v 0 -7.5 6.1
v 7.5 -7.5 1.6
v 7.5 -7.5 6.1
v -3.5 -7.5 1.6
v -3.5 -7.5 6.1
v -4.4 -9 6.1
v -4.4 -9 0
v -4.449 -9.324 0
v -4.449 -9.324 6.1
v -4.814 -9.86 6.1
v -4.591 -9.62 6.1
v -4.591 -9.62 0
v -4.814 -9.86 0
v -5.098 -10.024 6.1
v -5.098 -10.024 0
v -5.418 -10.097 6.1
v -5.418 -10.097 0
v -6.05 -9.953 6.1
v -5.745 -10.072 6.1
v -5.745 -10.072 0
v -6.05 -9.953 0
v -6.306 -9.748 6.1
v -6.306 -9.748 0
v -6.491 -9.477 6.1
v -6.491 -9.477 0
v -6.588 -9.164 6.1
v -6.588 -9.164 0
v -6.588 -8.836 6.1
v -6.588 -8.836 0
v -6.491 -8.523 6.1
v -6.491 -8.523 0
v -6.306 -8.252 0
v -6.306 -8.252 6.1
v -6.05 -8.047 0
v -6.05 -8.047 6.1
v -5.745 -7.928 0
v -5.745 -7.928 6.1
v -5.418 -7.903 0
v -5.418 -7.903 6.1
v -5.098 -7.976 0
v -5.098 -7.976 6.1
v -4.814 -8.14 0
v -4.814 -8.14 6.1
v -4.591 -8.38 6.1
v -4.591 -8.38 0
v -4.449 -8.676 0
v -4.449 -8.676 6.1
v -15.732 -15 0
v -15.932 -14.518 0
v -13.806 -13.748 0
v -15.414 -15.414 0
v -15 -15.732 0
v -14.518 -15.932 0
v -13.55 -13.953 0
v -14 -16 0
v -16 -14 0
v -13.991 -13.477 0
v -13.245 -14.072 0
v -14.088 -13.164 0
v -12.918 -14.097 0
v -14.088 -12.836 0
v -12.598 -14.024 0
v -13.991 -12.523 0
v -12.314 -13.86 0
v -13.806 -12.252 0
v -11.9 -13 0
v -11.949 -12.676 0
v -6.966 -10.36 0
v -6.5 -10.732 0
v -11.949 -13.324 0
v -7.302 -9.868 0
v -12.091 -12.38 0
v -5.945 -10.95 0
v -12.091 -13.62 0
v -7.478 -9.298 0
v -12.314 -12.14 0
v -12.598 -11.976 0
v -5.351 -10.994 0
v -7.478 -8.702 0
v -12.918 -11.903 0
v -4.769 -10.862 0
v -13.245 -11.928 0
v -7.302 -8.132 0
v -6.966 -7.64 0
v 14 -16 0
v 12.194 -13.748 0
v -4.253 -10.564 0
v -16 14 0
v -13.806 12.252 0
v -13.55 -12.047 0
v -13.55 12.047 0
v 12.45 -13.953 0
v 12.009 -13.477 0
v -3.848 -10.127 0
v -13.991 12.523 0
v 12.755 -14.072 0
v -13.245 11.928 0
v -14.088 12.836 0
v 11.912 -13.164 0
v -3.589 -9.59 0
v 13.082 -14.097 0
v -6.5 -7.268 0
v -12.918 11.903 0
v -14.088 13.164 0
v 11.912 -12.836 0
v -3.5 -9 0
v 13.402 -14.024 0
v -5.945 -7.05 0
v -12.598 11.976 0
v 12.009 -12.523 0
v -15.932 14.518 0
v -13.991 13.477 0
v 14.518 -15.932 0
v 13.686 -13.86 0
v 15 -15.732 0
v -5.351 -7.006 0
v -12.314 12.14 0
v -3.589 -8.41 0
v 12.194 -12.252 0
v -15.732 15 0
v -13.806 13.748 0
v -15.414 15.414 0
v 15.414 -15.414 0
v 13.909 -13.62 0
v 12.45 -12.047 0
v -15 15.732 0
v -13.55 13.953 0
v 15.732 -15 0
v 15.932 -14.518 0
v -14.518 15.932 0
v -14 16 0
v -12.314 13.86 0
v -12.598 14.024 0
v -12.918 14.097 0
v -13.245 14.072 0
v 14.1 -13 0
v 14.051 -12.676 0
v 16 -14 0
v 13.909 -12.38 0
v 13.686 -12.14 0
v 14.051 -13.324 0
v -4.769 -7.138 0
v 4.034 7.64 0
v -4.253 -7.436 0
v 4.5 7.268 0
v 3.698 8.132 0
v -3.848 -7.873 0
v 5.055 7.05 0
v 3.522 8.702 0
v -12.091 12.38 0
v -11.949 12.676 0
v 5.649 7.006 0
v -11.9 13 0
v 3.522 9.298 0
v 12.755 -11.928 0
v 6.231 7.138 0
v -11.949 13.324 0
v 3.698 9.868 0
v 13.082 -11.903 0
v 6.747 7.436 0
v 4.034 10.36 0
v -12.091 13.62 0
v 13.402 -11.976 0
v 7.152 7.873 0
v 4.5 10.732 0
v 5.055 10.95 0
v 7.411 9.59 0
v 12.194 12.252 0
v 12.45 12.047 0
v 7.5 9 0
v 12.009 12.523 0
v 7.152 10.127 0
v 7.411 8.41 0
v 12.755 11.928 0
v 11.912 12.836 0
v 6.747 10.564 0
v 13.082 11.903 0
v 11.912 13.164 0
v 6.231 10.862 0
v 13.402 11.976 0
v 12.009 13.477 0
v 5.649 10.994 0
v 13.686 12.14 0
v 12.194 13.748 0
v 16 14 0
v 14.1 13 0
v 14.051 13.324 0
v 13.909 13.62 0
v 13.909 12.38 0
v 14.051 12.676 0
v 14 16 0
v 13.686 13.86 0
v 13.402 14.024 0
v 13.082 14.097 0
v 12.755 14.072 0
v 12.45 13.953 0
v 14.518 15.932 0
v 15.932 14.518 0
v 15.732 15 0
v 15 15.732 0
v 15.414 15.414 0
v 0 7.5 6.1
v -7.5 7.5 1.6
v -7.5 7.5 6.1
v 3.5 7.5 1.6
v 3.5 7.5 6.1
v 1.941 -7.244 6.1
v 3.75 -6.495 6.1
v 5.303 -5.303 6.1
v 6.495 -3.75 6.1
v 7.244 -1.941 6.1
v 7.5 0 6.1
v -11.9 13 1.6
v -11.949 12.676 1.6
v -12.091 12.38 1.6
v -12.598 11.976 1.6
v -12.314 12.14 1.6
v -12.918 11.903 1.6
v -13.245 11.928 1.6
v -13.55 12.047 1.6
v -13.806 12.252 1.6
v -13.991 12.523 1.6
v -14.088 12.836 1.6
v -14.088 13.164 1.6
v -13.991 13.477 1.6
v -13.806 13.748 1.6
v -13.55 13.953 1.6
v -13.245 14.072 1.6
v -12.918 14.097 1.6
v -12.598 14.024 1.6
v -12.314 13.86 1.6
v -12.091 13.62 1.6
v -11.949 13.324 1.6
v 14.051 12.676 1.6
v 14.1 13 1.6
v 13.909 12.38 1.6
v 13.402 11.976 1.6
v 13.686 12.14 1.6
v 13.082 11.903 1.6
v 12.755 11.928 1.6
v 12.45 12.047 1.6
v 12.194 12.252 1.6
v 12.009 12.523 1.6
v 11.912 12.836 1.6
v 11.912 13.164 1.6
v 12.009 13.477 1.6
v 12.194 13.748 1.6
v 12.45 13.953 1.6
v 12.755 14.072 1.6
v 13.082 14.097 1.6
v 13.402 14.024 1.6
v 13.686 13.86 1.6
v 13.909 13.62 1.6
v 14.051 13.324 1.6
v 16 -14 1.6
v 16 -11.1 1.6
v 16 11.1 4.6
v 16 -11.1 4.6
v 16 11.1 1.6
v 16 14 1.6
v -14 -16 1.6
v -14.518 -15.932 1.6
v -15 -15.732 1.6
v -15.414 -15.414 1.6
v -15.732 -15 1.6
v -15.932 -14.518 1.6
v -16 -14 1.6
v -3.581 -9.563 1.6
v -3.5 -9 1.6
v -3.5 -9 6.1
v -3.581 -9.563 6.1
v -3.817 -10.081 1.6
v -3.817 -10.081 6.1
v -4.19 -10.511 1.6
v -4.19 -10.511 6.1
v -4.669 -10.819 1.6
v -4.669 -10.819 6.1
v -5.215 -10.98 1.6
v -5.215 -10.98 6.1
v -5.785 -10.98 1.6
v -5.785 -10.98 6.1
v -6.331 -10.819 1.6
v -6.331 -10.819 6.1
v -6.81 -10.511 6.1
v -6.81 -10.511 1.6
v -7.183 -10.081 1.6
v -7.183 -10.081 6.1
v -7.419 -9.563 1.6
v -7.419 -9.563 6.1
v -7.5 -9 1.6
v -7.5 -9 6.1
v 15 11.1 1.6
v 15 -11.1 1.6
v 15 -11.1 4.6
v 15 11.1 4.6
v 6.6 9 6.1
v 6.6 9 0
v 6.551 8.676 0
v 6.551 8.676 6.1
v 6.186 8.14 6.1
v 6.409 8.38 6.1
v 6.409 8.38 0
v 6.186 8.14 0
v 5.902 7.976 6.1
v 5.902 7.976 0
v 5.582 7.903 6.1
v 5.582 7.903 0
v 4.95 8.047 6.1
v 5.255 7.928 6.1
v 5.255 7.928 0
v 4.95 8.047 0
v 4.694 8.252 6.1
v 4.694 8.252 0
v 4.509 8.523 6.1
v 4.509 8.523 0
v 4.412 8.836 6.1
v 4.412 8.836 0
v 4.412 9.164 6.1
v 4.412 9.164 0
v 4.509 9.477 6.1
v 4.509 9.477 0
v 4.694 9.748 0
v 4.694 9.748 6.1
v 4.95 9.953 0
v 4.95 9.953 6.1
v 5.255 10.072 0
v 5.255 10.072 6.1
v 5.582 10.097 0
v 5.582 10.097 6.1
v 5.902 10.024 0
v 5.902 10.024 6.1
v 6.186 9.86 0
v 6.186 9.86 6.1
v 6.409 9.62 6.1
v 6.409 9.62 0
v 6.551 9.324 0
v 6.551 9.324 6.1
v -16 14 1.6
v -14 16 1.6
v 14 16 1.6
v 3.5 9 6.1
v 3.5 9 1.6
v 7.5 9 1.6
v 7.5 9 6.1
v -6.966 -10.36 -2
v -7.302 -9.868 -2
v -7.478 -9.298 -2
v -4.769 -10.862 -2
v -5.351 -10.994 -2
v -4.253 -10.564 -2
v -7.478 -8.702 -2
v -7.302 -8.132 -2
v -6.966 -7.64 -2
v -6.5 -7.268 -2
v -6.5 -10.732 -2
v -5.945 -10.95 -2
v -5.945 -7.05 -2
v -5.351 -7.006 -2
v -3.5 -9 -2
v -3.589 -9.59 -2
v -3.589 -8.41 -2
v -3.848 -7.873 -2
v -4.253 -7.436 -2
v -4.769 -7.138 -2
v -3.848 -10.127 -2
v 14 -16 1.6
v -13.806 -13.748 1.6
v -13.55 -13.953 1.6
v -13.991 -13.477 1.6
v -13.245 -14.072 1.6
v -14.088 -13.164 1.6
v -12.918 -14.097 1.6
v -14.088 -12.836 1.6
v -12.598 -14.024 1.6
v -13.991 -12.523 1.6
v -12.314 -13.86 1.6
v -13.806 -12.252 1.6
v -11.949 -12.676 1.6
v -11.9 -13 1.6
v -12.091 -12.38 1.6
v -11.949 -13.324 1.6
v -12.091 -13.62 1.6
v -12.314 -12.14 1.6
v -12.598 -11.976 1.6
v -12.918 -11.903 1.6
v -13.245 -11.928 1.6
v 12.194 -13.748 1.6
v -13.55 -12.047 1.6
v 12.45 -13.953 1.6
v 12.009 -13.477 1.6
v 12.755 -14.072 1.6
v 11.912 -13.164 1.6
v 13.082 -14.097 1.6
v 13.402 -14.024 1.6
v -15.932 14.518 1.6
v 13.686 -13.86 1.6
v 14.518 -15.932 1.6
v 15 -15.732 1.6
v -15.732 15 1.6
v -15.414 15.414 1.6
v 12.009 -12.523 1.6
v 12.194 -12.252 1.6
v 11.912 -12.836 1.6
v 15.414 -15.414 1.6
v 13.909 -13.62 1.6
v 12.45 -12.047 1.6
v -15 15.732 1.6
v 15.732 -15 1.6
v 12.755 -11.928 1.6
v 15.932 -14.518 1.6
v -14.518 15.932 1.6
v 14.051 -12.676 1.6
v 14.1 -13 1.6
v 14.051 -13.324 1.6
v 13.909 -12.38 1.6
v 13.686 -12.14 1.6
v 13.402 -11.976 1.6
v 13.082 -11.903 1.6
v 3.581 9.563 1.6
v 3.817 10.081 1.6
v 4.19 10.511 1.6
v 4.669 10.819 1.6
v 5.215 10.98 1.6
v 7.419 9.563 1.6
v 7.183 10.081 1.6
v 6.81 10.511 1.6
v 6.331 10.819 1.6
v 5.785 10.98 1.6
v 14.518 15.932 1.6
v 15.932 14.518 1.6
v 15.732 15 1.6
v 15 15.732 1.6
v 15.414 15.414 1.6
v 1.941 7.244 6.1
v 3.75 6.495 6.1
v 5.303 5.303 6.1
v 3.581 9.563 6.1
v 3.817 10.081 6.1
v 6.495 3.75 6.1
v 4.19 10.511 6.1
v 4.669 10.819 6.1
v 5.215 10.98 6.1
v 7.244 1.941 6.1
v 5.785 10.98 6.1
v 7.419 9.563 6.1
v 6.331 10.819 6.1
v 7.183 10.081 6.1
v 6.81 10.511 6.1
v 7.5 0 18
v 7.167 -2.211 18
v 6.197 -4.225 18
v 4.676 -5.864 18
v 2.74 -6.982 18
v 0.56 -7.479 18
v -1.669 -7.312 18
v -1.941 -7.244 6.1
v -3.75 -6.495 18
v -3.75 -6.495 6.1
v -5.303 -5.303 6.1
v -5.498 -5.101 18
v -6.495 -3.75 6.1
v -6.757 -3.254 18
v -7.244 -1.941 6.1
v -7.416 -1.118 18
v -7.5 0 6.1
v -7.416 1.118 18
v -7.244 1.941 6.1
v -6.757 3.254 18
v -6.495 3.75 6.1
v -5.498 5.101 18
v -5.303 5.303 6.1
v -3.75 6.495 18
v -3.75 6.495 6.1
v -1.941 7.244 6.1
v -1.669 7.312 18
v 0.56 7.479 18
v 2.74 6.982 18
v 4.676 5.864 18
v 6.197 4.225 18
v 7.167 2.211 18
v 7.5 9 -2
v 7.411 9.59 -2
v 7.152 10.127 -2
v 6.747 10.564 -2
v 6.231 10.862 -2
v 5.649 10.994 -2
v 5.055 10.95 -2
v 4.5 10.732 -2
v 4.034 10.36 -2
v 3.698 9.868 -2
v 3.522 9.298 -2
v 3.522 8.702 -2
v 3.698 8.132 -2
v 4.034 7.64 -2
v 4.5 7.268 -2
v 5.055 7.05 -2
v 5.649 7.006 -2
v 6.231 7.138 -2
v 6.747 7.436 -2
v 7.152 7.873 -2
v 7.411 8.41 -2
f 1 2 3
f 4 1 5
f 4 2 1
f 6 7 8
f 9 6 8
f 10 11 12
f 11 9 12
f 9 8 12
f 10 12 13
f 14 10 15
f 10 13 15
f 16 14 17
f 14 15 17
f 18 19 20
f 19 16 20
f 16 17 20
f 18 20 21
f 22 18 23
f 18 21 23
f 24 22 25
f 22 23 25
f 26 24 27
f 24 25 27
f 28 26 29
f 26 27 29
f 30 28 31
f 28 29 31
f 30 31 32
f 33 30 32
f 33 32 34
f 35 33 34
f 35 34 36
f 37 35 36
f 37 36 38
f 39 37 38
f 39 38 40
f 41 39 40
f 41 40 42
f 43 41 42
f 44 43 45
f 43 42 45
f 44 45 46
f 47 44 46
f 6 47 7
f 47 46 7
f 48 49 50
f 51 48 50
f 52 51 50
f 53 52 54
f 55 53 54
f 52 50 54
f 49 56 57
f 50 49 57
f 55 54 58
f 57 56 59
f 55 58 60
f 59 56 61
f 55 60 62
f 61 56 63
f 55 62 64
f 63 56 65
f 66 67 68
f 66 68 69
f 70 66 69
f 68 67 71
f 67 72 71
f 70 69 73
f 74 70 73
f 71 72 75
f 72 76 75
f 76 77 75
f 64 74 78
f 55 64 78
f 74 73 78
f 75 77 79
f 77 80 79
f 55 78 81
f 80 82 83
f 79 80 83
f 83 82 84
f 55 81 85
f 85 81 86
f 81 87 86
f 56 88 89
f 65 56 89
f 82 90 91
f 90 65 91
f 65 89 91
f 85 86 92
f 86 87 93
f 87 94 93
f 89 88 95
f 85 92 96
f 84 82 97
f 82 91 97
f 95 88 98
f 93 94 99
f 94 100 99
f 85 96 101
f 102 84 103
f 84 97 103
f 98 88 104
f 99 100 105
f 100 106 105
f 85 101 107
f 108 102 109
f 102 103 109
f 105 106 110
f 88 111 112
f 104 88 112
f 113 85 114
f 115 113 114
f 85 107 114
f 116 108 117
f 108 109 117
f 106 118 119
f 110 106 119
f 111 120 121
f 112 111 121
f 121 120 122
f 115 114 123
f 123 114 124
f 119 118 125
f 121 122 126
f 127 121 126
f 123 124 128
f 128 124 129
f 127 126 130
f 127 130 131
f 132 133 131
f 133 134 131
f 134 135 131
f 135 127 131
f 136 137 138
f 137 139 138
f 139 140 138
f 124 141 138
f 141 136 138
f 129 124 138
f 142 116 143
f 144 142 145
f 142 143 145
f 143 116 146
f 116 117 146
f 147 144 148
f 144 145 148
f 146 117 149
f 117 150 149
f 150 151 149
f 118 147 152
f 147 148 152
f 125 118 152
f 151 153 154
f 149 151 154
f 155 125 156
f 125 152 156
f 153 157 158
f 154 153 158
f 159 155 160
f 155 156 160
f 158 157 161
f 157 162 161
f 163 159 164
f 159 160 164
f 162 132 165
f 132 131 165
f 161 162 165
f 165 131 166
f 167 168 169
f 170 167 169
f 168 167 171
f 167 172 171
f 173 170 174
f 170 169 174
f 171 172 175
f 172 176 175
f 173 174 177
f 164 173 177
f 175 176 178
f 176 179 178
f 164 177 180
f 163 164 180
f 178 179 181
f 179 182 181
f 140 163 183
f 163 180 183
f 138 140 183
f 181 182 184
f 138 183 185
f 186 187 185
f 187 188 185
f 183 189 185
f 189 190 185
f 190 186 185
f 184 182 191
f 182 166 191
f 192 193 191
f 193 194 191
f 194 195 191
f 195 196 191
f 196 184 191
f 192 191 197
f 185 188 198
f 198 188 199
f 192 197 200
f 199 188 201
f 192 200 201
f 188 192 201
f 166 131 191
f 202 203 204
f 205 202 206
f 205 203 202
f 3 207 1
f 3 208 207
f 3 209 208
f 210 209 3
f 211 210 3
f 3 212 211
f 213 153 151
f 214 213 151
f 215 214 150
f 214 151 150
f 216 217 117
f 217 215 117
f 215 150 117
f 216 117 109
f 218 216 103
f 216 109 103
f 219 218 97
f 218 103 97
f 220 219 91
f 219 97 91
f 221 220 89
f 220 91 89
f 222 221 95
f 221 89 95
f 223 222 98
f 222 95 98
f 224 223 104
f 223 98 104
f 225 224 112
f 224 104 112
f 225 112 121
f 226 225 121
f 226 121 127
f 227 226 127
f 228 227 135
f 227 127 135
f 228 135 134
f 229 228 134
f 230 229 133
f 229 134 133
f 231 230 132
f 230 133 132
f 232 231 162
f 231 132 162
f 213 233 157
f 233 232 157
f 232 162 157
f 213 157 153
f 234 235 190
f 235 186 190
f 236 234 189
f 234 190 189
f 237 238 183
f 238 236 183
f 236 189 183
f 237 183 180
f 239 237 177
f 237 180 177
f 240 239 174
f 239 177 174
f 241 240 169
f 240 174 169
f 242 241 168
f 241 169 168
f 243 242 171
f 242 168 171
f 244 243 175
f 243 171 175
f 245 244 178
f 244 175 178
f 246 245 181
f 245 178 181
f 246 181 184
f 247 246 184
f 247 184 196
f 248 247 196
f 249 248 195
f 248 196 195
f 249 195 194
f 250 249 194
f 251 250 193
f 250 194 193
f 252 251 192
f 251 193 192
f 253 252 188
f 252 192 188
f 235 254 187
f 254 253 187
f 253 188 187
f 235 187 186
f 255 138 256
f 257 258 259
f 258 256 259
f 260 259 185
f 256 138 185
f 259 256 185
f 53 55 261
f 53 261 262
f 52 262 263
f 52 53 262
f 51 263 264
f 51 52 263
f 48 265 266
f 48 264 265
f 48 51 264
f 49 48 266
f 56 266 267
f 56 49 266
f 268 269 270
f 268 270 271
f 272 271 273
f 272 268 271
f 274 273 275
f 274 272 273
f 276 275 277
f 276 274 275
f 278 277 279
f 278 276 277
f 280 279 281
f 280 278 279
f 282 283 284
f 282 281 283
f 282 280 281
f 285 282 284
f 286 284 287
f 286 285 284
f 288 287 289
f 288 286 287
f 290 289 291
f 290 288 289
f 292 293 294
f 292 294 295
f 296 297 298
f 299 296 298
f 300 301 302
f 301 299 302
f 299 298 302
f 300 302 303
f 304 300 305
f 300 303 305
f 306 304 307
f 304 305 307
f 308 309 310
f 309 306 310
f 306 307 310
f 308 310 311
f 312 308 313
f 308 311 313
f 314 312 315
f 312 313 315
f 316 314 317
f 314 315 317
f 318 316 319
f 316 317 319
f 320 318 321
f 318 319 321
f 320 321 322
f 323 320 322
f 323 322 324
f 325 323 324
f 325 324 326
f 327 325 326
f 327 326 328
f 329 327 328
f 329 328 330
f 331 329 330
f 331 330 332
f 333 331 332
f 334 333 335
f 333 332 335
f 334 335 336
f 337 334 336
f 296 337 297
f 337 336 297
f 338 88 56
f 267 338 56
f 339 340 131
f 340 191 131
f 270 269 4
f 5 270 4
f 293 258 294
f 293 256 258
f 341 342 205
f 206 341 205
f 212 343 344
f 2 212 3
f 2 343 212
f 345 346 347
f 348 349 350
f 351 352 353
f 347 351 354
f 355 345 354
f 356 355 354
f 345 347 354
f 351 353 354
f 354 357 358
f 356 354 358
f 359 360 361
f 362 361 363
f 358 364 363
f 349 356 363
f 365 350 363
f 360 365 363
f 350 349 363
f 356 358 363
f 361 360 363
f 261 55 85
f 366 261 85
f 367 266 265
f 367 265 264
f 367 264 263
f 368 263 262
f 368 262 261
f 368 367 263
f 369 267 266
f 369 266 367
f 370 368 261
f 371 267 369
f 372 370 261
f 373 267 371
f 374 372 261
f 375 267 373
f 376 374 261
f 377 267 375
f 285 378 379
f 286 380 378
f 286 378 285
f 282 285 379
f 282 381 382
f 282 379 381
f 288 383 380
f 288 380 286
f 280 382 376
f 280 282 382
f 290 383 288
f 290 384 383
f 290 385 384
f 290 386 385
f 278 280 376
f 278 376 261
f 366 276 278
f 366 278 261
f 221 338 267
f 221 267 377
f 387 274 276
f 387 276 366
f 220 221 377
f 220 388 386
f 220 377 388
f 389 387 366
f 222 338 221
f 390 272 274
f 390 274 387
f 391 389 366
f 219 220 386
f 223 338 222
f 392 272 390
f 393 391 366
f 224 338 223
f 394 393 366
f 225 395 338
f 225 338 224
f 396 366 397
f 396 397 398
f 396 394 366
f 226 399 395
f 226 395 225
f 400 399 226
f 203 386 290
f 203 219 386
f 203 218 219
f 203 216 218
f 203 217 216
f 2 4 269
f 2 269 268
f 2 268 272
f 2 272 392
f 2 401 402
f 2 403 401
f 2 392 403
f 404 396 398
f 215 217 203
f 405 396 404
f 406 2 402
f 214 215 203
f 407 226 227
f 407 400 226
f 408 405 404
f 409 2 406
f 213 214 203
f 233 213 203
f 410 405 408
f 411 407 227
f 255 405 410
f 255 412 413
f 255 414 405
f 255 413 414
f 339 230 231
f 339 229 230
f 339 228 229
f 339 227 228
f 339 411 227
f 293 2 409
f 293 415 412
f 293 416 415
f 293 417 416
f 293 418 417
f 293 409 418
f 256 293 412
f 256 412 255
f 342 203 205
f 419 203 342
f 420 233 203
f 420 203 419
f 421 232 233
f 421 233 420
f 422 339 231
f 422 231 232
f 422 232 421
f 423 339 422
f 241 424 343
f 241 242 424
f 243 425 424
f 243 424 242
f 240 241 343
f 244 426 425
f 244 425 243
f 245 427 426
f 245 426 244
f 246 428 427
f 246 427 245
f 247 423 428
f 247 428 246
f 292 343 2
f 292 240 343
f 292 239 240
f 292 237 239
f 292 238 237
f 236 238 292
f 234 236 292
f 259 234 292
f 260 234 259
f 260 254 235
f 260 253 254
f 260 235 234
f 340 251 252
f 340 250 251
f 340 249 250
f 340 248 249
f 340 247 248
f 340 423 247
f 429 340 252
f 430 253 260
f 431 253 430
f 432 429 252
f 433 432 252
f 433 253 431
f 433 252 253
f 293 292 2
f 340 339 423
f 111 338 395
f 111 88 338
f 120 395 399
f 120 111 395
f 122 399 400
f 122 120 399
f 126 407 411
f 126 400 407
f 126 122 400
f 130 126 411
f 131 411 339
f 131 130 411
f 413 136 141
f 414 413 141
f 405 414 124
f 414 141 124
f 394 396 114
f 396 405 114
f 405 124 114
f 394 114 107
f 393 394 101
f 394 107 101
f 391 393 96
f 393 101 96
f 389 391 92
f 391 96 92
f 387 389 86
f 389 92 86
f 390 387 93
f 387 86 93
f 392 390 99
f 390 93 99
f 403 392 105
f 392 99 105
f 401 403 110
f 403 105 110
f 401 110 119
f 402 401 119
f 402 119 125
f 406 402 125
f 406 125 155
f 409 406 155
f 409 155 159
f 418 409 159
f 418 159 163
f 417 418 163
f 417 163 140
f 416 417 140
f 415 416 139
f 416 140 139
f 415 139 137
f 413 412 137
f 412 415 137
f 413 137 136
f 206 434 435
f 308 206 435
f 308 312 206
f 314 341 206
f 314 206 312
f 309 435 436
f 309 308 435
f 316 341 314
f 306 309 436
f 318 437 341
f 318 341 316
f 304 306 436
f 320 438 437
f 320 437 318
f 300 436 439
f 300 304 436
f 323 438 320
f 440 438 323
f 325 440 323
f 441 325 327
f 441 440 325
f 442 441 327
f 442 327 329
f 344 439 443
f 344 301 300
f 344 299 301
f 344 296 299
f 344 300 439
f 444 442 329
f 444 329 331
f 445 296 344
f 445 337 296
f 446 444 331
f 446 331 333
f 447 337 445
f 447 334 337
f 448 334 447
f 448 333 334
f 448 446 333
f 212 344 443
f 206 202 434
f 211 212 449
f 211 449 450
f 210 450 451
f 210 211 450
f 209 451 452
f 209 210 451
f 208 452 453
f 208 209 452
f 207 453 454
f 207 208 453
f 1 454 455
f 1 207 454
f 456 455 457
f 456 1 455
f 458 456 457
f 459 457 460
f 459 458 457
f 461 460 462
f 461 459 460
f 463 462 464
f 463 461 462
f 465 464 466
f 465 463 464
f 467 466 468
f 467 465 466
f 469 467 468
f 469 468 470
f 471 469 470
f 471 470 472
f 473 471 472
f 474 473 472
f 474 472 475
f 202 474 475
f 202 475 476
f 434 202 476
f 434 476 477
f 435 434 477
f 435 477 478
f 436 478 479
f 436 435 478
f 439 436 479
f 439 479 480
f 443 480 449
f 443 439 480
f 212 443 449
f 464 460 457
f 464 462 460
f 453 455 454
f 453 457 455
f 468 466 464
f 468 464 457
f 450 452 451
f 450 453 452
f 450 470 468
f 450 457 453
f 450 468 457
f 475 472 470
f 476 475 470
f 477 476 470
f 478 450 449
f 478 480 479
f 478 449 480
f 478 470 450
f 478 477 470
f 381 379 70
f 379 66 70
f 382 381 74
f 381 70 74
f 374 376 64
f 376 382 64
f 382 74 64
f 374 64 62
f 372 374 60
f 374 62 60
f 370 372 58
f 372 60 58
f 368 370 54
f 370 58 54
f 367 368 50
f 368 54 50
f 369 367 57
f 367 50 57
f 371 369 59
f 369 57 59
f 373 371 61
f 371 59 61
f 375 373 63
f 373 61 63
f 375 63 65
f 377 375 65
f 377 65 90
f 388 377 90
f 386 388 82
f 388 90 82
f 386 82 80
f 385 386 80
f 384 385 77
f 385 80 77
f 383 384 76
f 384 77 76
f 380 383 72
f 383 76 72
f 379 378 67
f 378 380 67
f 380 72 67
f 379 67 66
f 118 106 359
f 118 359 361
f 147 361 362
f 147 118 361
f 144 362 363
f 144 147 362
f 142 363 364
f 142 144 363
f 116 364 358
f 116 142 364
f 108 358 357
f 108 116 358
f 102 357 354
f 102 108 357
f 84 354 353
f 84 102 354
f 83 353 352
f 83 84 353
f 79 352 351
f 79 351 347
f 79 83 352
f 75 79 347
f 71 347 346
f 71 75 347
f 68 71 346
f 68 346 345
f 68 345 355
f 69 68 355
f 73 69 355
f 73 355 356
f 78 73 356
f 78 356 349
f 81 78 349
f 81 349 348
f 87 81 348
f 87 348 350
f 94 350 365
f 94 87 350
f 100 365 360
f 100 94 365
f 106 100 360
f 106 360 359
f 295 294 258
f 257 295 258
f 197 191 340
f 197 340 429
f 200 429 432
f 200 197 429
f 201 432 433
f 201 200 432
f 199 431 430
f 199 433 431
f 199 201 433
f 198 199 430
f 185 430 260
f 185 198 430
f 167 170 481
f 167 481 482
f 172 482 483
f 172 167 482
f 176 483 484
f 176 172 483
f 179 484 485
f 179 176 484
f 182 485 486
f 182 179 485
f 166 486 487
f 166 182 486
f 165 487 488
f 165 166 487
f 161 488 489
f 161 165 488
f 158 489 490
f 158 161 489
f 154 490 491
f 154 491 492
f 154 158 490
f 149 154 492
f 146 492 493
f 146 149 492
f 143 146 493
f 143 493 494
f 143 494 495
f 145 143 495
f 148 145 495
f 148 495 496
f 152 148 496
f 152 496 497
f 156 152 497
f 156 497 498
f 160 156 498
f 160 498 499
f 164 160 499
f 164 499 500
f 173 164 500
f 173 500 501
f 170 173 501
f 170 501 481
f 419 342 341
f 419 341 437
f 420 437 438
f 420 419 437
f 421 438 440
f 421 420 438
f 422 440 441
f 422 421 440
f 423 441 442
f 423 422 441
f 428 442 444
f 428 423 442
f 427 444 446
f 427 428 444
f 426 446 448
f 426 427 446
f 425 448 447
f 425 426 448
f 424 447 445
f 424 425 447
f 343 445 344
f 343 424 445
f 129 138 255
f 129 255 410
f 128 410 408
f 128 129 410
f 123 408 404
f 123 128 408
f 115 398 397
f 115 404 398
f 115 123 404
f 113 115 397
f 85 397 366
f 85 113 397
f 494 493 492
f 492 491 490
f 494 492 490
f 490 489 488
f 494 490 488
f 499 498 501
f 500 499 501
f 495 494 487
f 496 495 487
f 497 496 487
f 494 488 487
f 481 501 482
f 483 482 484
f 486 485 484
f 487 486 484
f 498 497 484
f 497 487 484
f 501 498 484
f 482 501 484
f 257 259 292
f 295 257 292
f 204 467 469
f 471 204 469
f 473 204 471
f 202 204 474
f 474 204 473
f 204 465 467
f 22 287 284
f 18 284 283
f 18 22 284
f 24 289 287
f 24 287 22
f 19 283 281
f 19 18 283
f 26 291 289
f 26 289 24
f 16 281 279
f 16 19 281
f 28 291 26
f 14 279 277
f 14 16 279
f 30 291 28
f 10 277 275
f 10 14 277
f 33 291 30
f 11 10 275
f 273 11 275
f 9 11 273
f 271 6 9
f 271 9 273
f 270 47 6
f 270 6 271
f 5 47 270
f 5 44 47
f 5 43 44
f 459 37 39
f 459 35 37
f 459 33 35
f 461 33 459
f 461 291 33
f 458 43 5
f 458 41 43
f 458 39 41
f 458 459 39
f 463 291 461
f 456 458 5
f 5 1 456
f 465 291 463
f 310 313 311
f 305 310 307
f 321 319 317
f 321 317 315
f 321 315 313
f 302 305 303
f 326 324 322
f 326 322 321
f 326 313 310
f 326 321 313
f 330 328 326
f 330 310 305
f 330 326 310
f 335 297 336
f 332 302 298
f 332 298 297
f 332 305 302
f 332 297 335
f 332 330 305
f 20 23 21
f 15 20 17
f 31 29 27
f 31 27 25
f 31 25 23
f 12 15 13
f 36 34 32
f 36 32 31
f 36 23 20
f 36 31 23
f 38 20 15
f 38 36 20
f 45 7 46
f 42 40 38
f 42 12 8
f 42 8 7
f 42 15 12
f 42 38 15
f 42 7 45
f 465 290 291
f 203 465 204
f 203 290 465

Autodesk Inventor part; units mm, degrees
ref_plane "YZ Plane" through (0, 0, 0) normal (1, 0, 0) x (0, 1, 0)
ref_plane "XZ Plane" through (0, 0, 0) normal (0, 1, 0) x (-1, 0, 0)
ref_plane "XY Plane" through (0, 0, 0) normal (0, 0, 1) x (1, 0, 0)
sketch "スケッチ1" plane through (0, 0, 0) normal (0, 0, 1) x (1, 0, 0)
  line L0 (14, 16) -> (-14, 16)
  line L1 (-16, 14) -> (-16, -14)
  line L2 (-14, -16) -> (14, -16)
  line L3 (16, -14) -> (16, 14)
  line L4 (16, 16) -> (-16, -16) construction
  line L5 (-16, 16) -> (16, -16) construction
  line L6 (-13, 13) -> (13, 13) construction
  line L7 (13, 13) -> (13, -13) construction
  line L8 (13, -13) -> (-13, -13) construction
  line L9 (-13, -13) -> (-13, 13) construction
  line L10 (-13, 13) -> (13, -13) construction
  line L11 (13, 13) -> (-13, -13) construction
  circle A0 centre (-13, -13) radius 1.1
  line L12 (-16, 0) -> (16, 0) construction
  line L13 (0, 16) -> (0, -16) construction
  circle A1 centre (-13, 13) radius 1.1
  circle A2 centre (13, -13) radius 1.1
  circle A3 centre (13, 13) radius 1.1
  circle A4 centre (-13, -13) radius 2 construction
  circle A5 centre (-13, 13) radius 2 construction
  circle A6 centre (13, -13) radius 2 construction
  circle A7 centre (13, 13) radius 2 construction
  circle A8 centre (0, 0) radius 7.5
  circle A9 centre (-5.5, -9) radius 1.1
  circle A10 centre (-5.5, -9) radius 2
  line L14 (-7.5, -9) -> (-7.5, 7.5)
  line L15 (-7.5, 7.5) -> (3.5, 7.5)
  line L16 (-3.5, -9) -> (-3.5, -7.5)
  circle A11 centre (5.5, 9) radius 2
  line L17 (3.5, 9) -> (3.5, 7.5)
  circle A12 centre (5.5, 9) radius 1.1
  line L18 (7.5, 9) -> (7.5, -7.5)
  line L19 (7.5, -7.5) -> (-3.5, -7.5)
  arc A13 (-16, -14) -> (-14, -16) centre (-14, -14) ccw
  arc A14 (14, -16) -> (16, -14) centre (14, -14) ccw
  arc A15 (16, 14) -> (14, 16) centre (14, 14) ccw
  arc A16 (-14, 16) -> (-16, 14) centre (-14, 14) ccw
  line L20 (16, -11.1) -> (15, -11.1)
  line L21 (15, -11.1) -> (15, 11.1)
  line L22 (16, 11.1) -> (15, 11.1)
  point P0 (-3.5, -7.5)
  point P1 (0, -7.5)
  point P2 (-7.5, 0)
  point P3 (7.5, 0)
  point P4 (0, 7.5)
  point P5 (3.5, 7.5)
  dimension "d0" = 32
  dimension "d1" = 32
  dimension "d5" = 2.2
  dimension "d6" = 4
  dimension "d11" = 2.2
  dimension "d12" = 4
  dimension "d20" = 360
  dimension "d22" = 11
  dimension "d34" = 2
  dimension "d35" = 3
  dimension "d36" = 3
  dimension "d37" = 22.2
  dimension "d38" = 1
  dimension "d39" = 18
extrude "押し出し1" add sketch "スケッチ1" along normal blind 1.6 contours A15 L3 L22 L21 L20 A14 L2 A13 L1 A16 L0 | L3 L20 L21 L22 | A8 | L18 L19 A8 | A8 L15 L17 A11 L18 | A8 L14 L15 | L19 L16 A10 L14 A8 | A11 | A10
extrude "押し出し2" add sketch "スケッチ1" along normal blind 4.6 contours L3 L20 L21 L22
extrude "押し出し3" add sketch "スケッチ1" along normal blind 6.1 contours L18 L19 A8 | A8 L15 L17 A11 L18 | A8 L14 L15 | L19 L16 A10 L14 A8 | A11 | A10
extrude "押し出し4" add sketch "スケッチ1" along normal blind 18 contours A8
extrude "押し出し5" add sketch "スケッチ1" against normal blind 2 contours A11 | A10 | A9 | A12
properties part number "KBCR-S08MMWK"
